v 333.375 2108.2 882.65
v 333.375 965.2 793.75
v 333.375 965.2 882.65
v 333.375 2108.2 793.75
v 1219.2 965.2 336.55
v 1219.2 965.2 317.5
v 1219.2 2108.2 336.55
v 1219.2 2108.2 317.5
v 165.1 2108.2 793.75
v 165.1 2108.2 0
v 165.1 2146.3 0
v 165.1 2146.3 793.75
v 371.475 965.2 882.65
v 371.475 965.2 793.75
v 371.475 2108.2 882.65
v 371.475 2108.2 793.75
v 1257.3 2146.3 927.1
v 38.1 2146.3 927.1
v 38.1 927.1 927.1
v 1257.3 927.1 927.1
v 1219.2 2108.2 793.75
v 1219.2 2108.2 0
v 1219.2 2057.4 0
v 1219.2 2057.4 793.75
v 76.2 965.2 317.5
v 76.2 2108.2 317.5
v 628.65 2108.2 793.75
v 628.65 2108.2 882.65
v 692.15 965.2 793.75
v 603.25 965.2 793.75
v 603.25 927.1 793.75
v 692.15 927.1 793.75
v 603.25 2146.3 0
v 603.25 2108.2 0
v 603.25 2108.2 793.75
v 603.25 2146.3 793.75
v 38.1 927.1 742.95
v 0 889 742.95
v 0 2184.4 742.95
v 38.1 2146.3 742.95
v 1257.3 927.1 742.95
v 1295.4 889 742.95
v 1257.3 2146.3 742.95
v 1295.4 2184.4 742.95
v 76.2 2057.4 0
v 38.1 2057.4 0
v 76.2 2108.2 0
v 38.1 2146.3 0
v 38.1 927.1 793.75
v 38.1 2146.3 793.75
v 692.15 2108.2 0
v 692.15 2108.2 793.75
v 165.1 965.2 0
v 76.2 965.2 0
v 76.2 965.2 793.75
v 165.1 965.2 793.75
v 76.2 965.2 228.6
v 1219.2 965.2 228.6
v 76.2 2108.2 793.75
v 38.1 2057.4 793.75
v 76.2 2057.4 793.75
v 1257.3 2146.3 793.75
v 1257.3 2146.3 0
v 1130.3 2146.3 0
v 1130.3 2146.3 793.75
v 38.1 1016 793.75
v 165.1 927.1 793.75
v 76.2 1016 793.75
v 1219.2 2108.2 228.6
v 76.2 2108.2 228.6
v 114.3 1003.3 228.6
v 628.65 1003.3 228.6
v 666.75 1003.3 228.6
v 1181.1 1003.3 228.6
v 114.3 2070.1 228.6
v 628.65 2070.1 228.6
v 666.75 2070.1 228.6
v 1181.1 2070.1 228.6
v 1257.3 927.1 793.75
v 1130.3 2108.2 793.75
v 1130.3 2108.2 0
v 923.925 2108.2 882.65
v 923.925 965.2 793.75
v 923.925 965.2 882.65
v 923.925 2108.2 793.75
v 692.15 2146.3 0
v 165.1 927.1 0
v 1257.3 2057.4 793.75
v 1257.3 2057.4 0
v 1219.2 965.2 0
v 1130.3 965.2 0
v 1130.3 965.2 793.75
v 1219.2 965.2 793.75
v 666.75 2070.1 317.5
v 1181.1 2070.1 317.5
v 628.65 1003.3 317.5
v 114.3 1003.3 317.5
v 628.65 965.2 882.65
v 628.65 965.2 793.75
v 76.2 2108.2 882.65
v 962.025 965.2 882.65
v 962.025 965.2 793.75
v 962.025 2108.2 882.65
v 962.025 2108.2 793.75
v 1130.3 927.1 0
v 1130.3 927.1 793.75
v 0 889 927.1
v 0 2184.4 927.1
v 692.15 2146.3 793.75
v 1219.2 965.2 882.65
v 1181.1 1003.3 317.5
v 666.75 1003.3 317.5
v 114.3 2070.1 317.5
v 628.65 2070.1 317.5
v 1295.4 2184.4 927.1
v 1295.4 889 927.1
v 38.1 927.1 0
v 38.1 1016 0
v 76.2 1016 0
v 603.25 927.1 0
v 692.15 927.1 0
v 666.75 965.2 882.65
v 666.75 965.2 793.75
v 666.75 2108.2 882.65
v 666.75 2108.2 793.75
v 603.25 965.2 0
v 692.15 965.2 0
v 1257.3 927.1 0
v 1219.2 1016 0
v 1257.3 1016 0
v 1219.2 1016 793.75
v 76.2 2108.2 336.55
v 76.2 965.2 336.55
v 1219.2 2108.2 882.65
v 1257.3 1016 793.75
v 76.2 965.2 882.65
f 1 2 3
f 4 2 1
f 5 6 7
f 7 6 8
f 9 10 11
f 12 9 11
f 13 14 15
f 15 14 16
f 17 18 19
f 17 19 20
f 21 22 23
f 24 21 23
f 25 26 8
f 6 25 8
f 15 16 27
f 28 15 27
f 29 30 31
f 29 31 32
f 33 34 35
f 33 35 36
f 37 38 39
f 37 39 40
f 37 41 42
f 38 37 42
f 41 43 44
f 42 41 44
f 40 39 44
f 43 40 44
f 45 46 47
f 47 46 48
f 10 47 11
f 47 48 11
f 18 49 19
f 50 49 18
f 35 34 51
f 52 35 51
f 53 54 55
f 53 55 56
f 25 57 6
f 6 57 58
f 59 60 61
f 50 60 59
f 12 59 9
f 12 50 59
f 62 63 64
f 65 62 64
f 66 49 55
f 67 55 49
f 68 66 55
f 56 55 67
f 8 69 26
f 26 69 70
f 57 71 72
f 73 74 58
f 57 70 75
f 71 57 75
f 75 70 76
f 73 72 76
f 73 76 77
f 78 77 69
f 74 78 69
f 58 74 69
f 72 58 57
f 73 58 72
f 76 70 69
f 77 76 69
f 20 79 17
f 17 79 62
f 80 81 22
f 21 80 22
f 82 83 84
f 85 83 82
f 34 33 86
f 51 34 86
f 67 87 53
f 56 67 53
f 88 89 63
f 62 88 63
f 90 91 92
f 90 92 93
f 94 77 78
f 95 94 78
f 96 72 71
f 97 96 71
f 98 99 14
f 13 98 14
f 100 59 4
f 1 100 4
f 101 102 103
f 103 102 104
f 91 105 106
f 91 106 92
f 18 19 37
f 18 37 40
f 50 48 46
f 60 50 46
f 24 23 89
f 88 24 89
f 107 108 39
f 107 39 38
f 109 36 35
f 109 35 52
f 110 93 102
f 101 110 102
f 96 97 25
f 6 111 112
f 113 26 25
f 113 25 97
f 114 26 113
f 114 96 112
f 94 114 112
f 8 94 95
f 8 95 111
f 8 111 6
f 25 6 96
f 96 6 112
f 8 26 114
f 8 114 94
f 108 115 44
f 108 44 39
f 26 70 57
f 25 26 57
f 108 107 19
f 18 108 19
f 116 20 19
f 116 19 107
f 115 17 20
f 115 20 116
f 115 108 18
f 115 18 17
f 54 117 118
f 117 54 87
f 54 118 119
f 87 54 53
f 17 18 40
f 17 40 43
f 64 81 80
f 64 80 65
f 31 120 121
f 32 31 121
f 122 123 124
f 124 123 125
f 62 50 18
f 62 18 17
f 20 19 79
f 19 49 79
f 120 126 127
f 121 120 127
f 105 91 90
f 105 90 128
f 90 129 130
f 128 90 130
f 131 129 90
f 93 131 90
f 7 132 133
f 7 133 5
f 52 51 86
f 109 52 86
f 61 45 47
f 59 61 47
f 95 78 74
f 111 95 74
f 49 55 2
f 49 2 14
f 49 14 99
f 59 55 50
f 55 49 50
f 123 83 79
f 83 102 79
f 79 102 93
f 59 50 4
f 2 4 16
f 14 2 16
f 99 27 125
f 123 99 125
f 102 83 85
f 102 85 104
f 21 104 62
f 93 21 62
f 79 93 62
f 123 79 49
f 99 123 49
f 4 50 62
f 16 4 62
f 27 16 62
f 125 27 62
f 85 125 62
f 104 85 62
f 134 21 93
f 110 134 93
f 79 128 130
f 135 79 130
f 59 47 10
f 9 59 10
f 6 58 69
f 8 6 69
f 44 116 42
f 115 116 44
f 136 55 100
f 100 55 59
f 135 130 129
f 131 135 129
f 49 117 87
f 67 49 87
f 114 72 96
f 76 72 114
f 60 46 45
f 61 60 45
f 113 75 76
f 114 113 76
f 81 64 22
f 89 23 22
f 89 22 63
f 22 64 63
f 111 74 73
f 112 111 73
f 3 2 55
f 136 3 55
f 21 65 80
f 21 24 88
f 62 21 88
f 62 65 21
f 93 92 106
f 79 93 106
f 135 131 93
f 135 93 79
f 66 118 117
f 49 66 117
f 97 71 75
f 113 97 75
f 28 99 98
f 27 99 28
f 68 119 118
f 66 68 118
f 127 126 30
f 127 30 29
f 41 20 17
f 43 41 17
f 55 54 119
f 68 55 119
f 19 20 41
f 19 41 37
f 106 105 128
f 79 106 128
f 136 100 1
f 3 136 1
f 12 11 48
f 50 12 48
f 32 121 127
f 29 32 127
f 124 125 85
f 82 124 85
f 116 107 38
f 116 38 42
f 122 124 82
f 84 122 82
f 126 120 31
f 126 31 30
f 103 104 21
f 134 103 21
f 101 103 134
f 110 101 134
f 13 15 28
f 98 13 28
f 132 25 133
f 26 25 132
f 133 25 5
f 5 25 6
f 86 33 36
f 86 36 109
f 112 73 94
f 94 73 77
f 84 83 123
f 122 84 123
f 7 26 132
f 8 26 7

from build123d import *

# Parameters (mm, degrees)
F2_W      = 88.9
F2_H      = 38.1
F3_DEPTH  = 793.75
F4_W      = 38.1
F4_H      = 1066.8
F5_DEPTH  = 88.9
F6_W      = 1143
F6_H      = 1143
F7_DEPTH  = 19.05
F8_W      = 38.1
F8_H      = 1143
F9_DEPTH  = 88.9
F10_W     = 1219.2
F10_H     = 1219.2
F11_DEPTH = 44.45
F12_W     = 38.1
F12_H     = 1219.2
F13_DEPTH = 184.15


with BuildPart() as f3:
    # F2 (on Top) → F3 (new body)
    with BuildSketch(Plane.XY):
        with Locations((120.65, 2127.25)):
            Rectangle(F2_W, F2_H)
        Polygon((76.2, 2108.2), (76.2, 2146.3), (38.1, 2146.3), (38.1, 2057.4), (76.2, 2057.4), align=None)
        Polygon((1257.3, 2057.4), (1257.3, 2146.3), (1219.2, 2146.3), (1219.2, 2108.2), (1219.2, 2057.4), align=None)
        with Locations((1174.75, 2127.25)):
            Rectangle(F2_W, F2_H)
        Polygon((1219.2, 927.1), (1257.3, 927.1), (1257.3, 1016), (1219.2, 1016), (1219.2, 965.2), align=None)
        with Locations((1174.75, 946.15)):
            Rectangle(F2_W, F2_H)
        Polygon((38.1, 927.1), (76.2, 927.1), (76.2, 965.2), (76.2, 1016), (38.1, 1016), align=None)
        with Locations((120.65, 946.15)):
            Rectangle(F2_W, F2_H)
        with Locations((647.7, 2127.25)):
            Rectangle(F2_W, F2_H)
        with Locations((647.7, 946.15)):
            Rectangle(F2_W, F2_H)
    extrude(amount=F3_DEPTH)


with BuildPart() as f5:
    # F4 (on offset) → F5 (new body)
    with BuildSketch(Plane.XY.offset(228.6)):
        Polygon((114.3, 2070.1), (114.3, 2108.2), (76.2, 2108.2), (76.2, 965.2), (114.3, 965.2), (114.3, 1003.3), align=None)
        Polygon((1181.1, 2108.2), (114.3, 2108.2), (114.3, 2070.1), (628.65, 2070.1), (666.75, 2070.1), (1181.1, 2070.1), align=None)
        Polygon((1219.2, 2108.2), (1181.1, 2108.2), (1181.1, 2070.1), (1181.1, 1003.3), (1181.1, 965.2), (1219.2, 965.2), align=None)
        Polygon((628.65, 1003.3), (114.3, 1003.3), (114.3, 965.2), (1181.1, 965.2), (1181.1, 1003.3), (666.75, 1003.3), align=None)
        with Locations((647.7, 1536.7)):
            Rectangle(F4_W, F4_H)
    extrude(amount=F5_DEPTH)


with BuildPart() as f7:
    # F6 (on face) → F7 (new body)
    with BuildSketch(Plane.XY.offset(317.5)):
        with Locations((647.7, 1536.7)):
            Rectangle(F6_W, F6_H)
    extrude(amount=F7_DEPTH)


with BuildPart() as f9:
    # F8 (on face) → F9 (new body)
    with BuildSketch(Plane.XY.offset(793.75)):
        Polygon((76.2, 2146.3), (38.1, 2146.3), (38.1, 927.1), (76.2, 927.1), (76.2, 965.2), (76.2, 2108.2), align=None)
        Polygon((1219.2, 2146.3), (76.2, 2146.3), (76.2, 2108.2), (333.375, 2108.2), (371.475, 2108.2), (628.65, 2108.2), (666.75, 2108.2), (923.925, 2108.2), (962.025, 2108.2), (1219.2, 2108.2), align=None)
        Polygon((1257.3, 2146.3), (1219.2, 2146.3), (1219.2, 2108.2), (1219.2, 965.2), (1219.2, 927.1), (1257.3, 927.1), align=None)
        Polygon((76.2, 965.2), (76.2, 927.1), (1219.2, 927.1), (1219.2, 965.2), (962.025, 965.2), (923.925, 965.2), (666.75, 965.2), (628.65, 965.2), (371.475, 965.2), (333.375, 965.2), align=None)
        with Locations((352.425, 1536.7)):
            Rectangle(F8_W, F8_H)
        with Locations((647.7, 1536.7)):
            Rectangle(F8_W, F8_H)
        with Locations((942.975, 1536.7)):
            Rectangle(F8_W, F8_H)
    extrude(amount=F9_DEPTH)

    # F10 (on face) → F11 (join)
    with BuildSketch(Plane.XY.offset(882.65)):
        with Locations((647.7, 1536.7)):
            Rectangle(F10_W, F10_H)
    extrude(amount=F11_DEPTH)


with BuildPart() as f13:
    # F12 (on face) → F13 (new body)
    with BuildSketch(Plane.XY.offset(927.1)):
        Polygon((1295.4, 2184.4), (0, 2184.4), (0, 2146.3), (38.1, 2146.3), (1257.3, 2146.3), (1295.4, 2146.3), align=None)
        with Locations((19.05, 1536.7)):
            Rectangle(F12_W, F12_H)
        with Locations((1276.35, 1536.7)):
            Rectangle(F12_W, F12_H)
        Polygon((38.1, 927.1), (0, 927.1), (0, 889), (1295.4, 889), (1295.4, 927.1), (1257.3, 927.1), align=None)
    extrude(amount=-F13_DEPTH)


solid = Compound([f3.part, f5.part, f7.part, f9.part, f13.part])
